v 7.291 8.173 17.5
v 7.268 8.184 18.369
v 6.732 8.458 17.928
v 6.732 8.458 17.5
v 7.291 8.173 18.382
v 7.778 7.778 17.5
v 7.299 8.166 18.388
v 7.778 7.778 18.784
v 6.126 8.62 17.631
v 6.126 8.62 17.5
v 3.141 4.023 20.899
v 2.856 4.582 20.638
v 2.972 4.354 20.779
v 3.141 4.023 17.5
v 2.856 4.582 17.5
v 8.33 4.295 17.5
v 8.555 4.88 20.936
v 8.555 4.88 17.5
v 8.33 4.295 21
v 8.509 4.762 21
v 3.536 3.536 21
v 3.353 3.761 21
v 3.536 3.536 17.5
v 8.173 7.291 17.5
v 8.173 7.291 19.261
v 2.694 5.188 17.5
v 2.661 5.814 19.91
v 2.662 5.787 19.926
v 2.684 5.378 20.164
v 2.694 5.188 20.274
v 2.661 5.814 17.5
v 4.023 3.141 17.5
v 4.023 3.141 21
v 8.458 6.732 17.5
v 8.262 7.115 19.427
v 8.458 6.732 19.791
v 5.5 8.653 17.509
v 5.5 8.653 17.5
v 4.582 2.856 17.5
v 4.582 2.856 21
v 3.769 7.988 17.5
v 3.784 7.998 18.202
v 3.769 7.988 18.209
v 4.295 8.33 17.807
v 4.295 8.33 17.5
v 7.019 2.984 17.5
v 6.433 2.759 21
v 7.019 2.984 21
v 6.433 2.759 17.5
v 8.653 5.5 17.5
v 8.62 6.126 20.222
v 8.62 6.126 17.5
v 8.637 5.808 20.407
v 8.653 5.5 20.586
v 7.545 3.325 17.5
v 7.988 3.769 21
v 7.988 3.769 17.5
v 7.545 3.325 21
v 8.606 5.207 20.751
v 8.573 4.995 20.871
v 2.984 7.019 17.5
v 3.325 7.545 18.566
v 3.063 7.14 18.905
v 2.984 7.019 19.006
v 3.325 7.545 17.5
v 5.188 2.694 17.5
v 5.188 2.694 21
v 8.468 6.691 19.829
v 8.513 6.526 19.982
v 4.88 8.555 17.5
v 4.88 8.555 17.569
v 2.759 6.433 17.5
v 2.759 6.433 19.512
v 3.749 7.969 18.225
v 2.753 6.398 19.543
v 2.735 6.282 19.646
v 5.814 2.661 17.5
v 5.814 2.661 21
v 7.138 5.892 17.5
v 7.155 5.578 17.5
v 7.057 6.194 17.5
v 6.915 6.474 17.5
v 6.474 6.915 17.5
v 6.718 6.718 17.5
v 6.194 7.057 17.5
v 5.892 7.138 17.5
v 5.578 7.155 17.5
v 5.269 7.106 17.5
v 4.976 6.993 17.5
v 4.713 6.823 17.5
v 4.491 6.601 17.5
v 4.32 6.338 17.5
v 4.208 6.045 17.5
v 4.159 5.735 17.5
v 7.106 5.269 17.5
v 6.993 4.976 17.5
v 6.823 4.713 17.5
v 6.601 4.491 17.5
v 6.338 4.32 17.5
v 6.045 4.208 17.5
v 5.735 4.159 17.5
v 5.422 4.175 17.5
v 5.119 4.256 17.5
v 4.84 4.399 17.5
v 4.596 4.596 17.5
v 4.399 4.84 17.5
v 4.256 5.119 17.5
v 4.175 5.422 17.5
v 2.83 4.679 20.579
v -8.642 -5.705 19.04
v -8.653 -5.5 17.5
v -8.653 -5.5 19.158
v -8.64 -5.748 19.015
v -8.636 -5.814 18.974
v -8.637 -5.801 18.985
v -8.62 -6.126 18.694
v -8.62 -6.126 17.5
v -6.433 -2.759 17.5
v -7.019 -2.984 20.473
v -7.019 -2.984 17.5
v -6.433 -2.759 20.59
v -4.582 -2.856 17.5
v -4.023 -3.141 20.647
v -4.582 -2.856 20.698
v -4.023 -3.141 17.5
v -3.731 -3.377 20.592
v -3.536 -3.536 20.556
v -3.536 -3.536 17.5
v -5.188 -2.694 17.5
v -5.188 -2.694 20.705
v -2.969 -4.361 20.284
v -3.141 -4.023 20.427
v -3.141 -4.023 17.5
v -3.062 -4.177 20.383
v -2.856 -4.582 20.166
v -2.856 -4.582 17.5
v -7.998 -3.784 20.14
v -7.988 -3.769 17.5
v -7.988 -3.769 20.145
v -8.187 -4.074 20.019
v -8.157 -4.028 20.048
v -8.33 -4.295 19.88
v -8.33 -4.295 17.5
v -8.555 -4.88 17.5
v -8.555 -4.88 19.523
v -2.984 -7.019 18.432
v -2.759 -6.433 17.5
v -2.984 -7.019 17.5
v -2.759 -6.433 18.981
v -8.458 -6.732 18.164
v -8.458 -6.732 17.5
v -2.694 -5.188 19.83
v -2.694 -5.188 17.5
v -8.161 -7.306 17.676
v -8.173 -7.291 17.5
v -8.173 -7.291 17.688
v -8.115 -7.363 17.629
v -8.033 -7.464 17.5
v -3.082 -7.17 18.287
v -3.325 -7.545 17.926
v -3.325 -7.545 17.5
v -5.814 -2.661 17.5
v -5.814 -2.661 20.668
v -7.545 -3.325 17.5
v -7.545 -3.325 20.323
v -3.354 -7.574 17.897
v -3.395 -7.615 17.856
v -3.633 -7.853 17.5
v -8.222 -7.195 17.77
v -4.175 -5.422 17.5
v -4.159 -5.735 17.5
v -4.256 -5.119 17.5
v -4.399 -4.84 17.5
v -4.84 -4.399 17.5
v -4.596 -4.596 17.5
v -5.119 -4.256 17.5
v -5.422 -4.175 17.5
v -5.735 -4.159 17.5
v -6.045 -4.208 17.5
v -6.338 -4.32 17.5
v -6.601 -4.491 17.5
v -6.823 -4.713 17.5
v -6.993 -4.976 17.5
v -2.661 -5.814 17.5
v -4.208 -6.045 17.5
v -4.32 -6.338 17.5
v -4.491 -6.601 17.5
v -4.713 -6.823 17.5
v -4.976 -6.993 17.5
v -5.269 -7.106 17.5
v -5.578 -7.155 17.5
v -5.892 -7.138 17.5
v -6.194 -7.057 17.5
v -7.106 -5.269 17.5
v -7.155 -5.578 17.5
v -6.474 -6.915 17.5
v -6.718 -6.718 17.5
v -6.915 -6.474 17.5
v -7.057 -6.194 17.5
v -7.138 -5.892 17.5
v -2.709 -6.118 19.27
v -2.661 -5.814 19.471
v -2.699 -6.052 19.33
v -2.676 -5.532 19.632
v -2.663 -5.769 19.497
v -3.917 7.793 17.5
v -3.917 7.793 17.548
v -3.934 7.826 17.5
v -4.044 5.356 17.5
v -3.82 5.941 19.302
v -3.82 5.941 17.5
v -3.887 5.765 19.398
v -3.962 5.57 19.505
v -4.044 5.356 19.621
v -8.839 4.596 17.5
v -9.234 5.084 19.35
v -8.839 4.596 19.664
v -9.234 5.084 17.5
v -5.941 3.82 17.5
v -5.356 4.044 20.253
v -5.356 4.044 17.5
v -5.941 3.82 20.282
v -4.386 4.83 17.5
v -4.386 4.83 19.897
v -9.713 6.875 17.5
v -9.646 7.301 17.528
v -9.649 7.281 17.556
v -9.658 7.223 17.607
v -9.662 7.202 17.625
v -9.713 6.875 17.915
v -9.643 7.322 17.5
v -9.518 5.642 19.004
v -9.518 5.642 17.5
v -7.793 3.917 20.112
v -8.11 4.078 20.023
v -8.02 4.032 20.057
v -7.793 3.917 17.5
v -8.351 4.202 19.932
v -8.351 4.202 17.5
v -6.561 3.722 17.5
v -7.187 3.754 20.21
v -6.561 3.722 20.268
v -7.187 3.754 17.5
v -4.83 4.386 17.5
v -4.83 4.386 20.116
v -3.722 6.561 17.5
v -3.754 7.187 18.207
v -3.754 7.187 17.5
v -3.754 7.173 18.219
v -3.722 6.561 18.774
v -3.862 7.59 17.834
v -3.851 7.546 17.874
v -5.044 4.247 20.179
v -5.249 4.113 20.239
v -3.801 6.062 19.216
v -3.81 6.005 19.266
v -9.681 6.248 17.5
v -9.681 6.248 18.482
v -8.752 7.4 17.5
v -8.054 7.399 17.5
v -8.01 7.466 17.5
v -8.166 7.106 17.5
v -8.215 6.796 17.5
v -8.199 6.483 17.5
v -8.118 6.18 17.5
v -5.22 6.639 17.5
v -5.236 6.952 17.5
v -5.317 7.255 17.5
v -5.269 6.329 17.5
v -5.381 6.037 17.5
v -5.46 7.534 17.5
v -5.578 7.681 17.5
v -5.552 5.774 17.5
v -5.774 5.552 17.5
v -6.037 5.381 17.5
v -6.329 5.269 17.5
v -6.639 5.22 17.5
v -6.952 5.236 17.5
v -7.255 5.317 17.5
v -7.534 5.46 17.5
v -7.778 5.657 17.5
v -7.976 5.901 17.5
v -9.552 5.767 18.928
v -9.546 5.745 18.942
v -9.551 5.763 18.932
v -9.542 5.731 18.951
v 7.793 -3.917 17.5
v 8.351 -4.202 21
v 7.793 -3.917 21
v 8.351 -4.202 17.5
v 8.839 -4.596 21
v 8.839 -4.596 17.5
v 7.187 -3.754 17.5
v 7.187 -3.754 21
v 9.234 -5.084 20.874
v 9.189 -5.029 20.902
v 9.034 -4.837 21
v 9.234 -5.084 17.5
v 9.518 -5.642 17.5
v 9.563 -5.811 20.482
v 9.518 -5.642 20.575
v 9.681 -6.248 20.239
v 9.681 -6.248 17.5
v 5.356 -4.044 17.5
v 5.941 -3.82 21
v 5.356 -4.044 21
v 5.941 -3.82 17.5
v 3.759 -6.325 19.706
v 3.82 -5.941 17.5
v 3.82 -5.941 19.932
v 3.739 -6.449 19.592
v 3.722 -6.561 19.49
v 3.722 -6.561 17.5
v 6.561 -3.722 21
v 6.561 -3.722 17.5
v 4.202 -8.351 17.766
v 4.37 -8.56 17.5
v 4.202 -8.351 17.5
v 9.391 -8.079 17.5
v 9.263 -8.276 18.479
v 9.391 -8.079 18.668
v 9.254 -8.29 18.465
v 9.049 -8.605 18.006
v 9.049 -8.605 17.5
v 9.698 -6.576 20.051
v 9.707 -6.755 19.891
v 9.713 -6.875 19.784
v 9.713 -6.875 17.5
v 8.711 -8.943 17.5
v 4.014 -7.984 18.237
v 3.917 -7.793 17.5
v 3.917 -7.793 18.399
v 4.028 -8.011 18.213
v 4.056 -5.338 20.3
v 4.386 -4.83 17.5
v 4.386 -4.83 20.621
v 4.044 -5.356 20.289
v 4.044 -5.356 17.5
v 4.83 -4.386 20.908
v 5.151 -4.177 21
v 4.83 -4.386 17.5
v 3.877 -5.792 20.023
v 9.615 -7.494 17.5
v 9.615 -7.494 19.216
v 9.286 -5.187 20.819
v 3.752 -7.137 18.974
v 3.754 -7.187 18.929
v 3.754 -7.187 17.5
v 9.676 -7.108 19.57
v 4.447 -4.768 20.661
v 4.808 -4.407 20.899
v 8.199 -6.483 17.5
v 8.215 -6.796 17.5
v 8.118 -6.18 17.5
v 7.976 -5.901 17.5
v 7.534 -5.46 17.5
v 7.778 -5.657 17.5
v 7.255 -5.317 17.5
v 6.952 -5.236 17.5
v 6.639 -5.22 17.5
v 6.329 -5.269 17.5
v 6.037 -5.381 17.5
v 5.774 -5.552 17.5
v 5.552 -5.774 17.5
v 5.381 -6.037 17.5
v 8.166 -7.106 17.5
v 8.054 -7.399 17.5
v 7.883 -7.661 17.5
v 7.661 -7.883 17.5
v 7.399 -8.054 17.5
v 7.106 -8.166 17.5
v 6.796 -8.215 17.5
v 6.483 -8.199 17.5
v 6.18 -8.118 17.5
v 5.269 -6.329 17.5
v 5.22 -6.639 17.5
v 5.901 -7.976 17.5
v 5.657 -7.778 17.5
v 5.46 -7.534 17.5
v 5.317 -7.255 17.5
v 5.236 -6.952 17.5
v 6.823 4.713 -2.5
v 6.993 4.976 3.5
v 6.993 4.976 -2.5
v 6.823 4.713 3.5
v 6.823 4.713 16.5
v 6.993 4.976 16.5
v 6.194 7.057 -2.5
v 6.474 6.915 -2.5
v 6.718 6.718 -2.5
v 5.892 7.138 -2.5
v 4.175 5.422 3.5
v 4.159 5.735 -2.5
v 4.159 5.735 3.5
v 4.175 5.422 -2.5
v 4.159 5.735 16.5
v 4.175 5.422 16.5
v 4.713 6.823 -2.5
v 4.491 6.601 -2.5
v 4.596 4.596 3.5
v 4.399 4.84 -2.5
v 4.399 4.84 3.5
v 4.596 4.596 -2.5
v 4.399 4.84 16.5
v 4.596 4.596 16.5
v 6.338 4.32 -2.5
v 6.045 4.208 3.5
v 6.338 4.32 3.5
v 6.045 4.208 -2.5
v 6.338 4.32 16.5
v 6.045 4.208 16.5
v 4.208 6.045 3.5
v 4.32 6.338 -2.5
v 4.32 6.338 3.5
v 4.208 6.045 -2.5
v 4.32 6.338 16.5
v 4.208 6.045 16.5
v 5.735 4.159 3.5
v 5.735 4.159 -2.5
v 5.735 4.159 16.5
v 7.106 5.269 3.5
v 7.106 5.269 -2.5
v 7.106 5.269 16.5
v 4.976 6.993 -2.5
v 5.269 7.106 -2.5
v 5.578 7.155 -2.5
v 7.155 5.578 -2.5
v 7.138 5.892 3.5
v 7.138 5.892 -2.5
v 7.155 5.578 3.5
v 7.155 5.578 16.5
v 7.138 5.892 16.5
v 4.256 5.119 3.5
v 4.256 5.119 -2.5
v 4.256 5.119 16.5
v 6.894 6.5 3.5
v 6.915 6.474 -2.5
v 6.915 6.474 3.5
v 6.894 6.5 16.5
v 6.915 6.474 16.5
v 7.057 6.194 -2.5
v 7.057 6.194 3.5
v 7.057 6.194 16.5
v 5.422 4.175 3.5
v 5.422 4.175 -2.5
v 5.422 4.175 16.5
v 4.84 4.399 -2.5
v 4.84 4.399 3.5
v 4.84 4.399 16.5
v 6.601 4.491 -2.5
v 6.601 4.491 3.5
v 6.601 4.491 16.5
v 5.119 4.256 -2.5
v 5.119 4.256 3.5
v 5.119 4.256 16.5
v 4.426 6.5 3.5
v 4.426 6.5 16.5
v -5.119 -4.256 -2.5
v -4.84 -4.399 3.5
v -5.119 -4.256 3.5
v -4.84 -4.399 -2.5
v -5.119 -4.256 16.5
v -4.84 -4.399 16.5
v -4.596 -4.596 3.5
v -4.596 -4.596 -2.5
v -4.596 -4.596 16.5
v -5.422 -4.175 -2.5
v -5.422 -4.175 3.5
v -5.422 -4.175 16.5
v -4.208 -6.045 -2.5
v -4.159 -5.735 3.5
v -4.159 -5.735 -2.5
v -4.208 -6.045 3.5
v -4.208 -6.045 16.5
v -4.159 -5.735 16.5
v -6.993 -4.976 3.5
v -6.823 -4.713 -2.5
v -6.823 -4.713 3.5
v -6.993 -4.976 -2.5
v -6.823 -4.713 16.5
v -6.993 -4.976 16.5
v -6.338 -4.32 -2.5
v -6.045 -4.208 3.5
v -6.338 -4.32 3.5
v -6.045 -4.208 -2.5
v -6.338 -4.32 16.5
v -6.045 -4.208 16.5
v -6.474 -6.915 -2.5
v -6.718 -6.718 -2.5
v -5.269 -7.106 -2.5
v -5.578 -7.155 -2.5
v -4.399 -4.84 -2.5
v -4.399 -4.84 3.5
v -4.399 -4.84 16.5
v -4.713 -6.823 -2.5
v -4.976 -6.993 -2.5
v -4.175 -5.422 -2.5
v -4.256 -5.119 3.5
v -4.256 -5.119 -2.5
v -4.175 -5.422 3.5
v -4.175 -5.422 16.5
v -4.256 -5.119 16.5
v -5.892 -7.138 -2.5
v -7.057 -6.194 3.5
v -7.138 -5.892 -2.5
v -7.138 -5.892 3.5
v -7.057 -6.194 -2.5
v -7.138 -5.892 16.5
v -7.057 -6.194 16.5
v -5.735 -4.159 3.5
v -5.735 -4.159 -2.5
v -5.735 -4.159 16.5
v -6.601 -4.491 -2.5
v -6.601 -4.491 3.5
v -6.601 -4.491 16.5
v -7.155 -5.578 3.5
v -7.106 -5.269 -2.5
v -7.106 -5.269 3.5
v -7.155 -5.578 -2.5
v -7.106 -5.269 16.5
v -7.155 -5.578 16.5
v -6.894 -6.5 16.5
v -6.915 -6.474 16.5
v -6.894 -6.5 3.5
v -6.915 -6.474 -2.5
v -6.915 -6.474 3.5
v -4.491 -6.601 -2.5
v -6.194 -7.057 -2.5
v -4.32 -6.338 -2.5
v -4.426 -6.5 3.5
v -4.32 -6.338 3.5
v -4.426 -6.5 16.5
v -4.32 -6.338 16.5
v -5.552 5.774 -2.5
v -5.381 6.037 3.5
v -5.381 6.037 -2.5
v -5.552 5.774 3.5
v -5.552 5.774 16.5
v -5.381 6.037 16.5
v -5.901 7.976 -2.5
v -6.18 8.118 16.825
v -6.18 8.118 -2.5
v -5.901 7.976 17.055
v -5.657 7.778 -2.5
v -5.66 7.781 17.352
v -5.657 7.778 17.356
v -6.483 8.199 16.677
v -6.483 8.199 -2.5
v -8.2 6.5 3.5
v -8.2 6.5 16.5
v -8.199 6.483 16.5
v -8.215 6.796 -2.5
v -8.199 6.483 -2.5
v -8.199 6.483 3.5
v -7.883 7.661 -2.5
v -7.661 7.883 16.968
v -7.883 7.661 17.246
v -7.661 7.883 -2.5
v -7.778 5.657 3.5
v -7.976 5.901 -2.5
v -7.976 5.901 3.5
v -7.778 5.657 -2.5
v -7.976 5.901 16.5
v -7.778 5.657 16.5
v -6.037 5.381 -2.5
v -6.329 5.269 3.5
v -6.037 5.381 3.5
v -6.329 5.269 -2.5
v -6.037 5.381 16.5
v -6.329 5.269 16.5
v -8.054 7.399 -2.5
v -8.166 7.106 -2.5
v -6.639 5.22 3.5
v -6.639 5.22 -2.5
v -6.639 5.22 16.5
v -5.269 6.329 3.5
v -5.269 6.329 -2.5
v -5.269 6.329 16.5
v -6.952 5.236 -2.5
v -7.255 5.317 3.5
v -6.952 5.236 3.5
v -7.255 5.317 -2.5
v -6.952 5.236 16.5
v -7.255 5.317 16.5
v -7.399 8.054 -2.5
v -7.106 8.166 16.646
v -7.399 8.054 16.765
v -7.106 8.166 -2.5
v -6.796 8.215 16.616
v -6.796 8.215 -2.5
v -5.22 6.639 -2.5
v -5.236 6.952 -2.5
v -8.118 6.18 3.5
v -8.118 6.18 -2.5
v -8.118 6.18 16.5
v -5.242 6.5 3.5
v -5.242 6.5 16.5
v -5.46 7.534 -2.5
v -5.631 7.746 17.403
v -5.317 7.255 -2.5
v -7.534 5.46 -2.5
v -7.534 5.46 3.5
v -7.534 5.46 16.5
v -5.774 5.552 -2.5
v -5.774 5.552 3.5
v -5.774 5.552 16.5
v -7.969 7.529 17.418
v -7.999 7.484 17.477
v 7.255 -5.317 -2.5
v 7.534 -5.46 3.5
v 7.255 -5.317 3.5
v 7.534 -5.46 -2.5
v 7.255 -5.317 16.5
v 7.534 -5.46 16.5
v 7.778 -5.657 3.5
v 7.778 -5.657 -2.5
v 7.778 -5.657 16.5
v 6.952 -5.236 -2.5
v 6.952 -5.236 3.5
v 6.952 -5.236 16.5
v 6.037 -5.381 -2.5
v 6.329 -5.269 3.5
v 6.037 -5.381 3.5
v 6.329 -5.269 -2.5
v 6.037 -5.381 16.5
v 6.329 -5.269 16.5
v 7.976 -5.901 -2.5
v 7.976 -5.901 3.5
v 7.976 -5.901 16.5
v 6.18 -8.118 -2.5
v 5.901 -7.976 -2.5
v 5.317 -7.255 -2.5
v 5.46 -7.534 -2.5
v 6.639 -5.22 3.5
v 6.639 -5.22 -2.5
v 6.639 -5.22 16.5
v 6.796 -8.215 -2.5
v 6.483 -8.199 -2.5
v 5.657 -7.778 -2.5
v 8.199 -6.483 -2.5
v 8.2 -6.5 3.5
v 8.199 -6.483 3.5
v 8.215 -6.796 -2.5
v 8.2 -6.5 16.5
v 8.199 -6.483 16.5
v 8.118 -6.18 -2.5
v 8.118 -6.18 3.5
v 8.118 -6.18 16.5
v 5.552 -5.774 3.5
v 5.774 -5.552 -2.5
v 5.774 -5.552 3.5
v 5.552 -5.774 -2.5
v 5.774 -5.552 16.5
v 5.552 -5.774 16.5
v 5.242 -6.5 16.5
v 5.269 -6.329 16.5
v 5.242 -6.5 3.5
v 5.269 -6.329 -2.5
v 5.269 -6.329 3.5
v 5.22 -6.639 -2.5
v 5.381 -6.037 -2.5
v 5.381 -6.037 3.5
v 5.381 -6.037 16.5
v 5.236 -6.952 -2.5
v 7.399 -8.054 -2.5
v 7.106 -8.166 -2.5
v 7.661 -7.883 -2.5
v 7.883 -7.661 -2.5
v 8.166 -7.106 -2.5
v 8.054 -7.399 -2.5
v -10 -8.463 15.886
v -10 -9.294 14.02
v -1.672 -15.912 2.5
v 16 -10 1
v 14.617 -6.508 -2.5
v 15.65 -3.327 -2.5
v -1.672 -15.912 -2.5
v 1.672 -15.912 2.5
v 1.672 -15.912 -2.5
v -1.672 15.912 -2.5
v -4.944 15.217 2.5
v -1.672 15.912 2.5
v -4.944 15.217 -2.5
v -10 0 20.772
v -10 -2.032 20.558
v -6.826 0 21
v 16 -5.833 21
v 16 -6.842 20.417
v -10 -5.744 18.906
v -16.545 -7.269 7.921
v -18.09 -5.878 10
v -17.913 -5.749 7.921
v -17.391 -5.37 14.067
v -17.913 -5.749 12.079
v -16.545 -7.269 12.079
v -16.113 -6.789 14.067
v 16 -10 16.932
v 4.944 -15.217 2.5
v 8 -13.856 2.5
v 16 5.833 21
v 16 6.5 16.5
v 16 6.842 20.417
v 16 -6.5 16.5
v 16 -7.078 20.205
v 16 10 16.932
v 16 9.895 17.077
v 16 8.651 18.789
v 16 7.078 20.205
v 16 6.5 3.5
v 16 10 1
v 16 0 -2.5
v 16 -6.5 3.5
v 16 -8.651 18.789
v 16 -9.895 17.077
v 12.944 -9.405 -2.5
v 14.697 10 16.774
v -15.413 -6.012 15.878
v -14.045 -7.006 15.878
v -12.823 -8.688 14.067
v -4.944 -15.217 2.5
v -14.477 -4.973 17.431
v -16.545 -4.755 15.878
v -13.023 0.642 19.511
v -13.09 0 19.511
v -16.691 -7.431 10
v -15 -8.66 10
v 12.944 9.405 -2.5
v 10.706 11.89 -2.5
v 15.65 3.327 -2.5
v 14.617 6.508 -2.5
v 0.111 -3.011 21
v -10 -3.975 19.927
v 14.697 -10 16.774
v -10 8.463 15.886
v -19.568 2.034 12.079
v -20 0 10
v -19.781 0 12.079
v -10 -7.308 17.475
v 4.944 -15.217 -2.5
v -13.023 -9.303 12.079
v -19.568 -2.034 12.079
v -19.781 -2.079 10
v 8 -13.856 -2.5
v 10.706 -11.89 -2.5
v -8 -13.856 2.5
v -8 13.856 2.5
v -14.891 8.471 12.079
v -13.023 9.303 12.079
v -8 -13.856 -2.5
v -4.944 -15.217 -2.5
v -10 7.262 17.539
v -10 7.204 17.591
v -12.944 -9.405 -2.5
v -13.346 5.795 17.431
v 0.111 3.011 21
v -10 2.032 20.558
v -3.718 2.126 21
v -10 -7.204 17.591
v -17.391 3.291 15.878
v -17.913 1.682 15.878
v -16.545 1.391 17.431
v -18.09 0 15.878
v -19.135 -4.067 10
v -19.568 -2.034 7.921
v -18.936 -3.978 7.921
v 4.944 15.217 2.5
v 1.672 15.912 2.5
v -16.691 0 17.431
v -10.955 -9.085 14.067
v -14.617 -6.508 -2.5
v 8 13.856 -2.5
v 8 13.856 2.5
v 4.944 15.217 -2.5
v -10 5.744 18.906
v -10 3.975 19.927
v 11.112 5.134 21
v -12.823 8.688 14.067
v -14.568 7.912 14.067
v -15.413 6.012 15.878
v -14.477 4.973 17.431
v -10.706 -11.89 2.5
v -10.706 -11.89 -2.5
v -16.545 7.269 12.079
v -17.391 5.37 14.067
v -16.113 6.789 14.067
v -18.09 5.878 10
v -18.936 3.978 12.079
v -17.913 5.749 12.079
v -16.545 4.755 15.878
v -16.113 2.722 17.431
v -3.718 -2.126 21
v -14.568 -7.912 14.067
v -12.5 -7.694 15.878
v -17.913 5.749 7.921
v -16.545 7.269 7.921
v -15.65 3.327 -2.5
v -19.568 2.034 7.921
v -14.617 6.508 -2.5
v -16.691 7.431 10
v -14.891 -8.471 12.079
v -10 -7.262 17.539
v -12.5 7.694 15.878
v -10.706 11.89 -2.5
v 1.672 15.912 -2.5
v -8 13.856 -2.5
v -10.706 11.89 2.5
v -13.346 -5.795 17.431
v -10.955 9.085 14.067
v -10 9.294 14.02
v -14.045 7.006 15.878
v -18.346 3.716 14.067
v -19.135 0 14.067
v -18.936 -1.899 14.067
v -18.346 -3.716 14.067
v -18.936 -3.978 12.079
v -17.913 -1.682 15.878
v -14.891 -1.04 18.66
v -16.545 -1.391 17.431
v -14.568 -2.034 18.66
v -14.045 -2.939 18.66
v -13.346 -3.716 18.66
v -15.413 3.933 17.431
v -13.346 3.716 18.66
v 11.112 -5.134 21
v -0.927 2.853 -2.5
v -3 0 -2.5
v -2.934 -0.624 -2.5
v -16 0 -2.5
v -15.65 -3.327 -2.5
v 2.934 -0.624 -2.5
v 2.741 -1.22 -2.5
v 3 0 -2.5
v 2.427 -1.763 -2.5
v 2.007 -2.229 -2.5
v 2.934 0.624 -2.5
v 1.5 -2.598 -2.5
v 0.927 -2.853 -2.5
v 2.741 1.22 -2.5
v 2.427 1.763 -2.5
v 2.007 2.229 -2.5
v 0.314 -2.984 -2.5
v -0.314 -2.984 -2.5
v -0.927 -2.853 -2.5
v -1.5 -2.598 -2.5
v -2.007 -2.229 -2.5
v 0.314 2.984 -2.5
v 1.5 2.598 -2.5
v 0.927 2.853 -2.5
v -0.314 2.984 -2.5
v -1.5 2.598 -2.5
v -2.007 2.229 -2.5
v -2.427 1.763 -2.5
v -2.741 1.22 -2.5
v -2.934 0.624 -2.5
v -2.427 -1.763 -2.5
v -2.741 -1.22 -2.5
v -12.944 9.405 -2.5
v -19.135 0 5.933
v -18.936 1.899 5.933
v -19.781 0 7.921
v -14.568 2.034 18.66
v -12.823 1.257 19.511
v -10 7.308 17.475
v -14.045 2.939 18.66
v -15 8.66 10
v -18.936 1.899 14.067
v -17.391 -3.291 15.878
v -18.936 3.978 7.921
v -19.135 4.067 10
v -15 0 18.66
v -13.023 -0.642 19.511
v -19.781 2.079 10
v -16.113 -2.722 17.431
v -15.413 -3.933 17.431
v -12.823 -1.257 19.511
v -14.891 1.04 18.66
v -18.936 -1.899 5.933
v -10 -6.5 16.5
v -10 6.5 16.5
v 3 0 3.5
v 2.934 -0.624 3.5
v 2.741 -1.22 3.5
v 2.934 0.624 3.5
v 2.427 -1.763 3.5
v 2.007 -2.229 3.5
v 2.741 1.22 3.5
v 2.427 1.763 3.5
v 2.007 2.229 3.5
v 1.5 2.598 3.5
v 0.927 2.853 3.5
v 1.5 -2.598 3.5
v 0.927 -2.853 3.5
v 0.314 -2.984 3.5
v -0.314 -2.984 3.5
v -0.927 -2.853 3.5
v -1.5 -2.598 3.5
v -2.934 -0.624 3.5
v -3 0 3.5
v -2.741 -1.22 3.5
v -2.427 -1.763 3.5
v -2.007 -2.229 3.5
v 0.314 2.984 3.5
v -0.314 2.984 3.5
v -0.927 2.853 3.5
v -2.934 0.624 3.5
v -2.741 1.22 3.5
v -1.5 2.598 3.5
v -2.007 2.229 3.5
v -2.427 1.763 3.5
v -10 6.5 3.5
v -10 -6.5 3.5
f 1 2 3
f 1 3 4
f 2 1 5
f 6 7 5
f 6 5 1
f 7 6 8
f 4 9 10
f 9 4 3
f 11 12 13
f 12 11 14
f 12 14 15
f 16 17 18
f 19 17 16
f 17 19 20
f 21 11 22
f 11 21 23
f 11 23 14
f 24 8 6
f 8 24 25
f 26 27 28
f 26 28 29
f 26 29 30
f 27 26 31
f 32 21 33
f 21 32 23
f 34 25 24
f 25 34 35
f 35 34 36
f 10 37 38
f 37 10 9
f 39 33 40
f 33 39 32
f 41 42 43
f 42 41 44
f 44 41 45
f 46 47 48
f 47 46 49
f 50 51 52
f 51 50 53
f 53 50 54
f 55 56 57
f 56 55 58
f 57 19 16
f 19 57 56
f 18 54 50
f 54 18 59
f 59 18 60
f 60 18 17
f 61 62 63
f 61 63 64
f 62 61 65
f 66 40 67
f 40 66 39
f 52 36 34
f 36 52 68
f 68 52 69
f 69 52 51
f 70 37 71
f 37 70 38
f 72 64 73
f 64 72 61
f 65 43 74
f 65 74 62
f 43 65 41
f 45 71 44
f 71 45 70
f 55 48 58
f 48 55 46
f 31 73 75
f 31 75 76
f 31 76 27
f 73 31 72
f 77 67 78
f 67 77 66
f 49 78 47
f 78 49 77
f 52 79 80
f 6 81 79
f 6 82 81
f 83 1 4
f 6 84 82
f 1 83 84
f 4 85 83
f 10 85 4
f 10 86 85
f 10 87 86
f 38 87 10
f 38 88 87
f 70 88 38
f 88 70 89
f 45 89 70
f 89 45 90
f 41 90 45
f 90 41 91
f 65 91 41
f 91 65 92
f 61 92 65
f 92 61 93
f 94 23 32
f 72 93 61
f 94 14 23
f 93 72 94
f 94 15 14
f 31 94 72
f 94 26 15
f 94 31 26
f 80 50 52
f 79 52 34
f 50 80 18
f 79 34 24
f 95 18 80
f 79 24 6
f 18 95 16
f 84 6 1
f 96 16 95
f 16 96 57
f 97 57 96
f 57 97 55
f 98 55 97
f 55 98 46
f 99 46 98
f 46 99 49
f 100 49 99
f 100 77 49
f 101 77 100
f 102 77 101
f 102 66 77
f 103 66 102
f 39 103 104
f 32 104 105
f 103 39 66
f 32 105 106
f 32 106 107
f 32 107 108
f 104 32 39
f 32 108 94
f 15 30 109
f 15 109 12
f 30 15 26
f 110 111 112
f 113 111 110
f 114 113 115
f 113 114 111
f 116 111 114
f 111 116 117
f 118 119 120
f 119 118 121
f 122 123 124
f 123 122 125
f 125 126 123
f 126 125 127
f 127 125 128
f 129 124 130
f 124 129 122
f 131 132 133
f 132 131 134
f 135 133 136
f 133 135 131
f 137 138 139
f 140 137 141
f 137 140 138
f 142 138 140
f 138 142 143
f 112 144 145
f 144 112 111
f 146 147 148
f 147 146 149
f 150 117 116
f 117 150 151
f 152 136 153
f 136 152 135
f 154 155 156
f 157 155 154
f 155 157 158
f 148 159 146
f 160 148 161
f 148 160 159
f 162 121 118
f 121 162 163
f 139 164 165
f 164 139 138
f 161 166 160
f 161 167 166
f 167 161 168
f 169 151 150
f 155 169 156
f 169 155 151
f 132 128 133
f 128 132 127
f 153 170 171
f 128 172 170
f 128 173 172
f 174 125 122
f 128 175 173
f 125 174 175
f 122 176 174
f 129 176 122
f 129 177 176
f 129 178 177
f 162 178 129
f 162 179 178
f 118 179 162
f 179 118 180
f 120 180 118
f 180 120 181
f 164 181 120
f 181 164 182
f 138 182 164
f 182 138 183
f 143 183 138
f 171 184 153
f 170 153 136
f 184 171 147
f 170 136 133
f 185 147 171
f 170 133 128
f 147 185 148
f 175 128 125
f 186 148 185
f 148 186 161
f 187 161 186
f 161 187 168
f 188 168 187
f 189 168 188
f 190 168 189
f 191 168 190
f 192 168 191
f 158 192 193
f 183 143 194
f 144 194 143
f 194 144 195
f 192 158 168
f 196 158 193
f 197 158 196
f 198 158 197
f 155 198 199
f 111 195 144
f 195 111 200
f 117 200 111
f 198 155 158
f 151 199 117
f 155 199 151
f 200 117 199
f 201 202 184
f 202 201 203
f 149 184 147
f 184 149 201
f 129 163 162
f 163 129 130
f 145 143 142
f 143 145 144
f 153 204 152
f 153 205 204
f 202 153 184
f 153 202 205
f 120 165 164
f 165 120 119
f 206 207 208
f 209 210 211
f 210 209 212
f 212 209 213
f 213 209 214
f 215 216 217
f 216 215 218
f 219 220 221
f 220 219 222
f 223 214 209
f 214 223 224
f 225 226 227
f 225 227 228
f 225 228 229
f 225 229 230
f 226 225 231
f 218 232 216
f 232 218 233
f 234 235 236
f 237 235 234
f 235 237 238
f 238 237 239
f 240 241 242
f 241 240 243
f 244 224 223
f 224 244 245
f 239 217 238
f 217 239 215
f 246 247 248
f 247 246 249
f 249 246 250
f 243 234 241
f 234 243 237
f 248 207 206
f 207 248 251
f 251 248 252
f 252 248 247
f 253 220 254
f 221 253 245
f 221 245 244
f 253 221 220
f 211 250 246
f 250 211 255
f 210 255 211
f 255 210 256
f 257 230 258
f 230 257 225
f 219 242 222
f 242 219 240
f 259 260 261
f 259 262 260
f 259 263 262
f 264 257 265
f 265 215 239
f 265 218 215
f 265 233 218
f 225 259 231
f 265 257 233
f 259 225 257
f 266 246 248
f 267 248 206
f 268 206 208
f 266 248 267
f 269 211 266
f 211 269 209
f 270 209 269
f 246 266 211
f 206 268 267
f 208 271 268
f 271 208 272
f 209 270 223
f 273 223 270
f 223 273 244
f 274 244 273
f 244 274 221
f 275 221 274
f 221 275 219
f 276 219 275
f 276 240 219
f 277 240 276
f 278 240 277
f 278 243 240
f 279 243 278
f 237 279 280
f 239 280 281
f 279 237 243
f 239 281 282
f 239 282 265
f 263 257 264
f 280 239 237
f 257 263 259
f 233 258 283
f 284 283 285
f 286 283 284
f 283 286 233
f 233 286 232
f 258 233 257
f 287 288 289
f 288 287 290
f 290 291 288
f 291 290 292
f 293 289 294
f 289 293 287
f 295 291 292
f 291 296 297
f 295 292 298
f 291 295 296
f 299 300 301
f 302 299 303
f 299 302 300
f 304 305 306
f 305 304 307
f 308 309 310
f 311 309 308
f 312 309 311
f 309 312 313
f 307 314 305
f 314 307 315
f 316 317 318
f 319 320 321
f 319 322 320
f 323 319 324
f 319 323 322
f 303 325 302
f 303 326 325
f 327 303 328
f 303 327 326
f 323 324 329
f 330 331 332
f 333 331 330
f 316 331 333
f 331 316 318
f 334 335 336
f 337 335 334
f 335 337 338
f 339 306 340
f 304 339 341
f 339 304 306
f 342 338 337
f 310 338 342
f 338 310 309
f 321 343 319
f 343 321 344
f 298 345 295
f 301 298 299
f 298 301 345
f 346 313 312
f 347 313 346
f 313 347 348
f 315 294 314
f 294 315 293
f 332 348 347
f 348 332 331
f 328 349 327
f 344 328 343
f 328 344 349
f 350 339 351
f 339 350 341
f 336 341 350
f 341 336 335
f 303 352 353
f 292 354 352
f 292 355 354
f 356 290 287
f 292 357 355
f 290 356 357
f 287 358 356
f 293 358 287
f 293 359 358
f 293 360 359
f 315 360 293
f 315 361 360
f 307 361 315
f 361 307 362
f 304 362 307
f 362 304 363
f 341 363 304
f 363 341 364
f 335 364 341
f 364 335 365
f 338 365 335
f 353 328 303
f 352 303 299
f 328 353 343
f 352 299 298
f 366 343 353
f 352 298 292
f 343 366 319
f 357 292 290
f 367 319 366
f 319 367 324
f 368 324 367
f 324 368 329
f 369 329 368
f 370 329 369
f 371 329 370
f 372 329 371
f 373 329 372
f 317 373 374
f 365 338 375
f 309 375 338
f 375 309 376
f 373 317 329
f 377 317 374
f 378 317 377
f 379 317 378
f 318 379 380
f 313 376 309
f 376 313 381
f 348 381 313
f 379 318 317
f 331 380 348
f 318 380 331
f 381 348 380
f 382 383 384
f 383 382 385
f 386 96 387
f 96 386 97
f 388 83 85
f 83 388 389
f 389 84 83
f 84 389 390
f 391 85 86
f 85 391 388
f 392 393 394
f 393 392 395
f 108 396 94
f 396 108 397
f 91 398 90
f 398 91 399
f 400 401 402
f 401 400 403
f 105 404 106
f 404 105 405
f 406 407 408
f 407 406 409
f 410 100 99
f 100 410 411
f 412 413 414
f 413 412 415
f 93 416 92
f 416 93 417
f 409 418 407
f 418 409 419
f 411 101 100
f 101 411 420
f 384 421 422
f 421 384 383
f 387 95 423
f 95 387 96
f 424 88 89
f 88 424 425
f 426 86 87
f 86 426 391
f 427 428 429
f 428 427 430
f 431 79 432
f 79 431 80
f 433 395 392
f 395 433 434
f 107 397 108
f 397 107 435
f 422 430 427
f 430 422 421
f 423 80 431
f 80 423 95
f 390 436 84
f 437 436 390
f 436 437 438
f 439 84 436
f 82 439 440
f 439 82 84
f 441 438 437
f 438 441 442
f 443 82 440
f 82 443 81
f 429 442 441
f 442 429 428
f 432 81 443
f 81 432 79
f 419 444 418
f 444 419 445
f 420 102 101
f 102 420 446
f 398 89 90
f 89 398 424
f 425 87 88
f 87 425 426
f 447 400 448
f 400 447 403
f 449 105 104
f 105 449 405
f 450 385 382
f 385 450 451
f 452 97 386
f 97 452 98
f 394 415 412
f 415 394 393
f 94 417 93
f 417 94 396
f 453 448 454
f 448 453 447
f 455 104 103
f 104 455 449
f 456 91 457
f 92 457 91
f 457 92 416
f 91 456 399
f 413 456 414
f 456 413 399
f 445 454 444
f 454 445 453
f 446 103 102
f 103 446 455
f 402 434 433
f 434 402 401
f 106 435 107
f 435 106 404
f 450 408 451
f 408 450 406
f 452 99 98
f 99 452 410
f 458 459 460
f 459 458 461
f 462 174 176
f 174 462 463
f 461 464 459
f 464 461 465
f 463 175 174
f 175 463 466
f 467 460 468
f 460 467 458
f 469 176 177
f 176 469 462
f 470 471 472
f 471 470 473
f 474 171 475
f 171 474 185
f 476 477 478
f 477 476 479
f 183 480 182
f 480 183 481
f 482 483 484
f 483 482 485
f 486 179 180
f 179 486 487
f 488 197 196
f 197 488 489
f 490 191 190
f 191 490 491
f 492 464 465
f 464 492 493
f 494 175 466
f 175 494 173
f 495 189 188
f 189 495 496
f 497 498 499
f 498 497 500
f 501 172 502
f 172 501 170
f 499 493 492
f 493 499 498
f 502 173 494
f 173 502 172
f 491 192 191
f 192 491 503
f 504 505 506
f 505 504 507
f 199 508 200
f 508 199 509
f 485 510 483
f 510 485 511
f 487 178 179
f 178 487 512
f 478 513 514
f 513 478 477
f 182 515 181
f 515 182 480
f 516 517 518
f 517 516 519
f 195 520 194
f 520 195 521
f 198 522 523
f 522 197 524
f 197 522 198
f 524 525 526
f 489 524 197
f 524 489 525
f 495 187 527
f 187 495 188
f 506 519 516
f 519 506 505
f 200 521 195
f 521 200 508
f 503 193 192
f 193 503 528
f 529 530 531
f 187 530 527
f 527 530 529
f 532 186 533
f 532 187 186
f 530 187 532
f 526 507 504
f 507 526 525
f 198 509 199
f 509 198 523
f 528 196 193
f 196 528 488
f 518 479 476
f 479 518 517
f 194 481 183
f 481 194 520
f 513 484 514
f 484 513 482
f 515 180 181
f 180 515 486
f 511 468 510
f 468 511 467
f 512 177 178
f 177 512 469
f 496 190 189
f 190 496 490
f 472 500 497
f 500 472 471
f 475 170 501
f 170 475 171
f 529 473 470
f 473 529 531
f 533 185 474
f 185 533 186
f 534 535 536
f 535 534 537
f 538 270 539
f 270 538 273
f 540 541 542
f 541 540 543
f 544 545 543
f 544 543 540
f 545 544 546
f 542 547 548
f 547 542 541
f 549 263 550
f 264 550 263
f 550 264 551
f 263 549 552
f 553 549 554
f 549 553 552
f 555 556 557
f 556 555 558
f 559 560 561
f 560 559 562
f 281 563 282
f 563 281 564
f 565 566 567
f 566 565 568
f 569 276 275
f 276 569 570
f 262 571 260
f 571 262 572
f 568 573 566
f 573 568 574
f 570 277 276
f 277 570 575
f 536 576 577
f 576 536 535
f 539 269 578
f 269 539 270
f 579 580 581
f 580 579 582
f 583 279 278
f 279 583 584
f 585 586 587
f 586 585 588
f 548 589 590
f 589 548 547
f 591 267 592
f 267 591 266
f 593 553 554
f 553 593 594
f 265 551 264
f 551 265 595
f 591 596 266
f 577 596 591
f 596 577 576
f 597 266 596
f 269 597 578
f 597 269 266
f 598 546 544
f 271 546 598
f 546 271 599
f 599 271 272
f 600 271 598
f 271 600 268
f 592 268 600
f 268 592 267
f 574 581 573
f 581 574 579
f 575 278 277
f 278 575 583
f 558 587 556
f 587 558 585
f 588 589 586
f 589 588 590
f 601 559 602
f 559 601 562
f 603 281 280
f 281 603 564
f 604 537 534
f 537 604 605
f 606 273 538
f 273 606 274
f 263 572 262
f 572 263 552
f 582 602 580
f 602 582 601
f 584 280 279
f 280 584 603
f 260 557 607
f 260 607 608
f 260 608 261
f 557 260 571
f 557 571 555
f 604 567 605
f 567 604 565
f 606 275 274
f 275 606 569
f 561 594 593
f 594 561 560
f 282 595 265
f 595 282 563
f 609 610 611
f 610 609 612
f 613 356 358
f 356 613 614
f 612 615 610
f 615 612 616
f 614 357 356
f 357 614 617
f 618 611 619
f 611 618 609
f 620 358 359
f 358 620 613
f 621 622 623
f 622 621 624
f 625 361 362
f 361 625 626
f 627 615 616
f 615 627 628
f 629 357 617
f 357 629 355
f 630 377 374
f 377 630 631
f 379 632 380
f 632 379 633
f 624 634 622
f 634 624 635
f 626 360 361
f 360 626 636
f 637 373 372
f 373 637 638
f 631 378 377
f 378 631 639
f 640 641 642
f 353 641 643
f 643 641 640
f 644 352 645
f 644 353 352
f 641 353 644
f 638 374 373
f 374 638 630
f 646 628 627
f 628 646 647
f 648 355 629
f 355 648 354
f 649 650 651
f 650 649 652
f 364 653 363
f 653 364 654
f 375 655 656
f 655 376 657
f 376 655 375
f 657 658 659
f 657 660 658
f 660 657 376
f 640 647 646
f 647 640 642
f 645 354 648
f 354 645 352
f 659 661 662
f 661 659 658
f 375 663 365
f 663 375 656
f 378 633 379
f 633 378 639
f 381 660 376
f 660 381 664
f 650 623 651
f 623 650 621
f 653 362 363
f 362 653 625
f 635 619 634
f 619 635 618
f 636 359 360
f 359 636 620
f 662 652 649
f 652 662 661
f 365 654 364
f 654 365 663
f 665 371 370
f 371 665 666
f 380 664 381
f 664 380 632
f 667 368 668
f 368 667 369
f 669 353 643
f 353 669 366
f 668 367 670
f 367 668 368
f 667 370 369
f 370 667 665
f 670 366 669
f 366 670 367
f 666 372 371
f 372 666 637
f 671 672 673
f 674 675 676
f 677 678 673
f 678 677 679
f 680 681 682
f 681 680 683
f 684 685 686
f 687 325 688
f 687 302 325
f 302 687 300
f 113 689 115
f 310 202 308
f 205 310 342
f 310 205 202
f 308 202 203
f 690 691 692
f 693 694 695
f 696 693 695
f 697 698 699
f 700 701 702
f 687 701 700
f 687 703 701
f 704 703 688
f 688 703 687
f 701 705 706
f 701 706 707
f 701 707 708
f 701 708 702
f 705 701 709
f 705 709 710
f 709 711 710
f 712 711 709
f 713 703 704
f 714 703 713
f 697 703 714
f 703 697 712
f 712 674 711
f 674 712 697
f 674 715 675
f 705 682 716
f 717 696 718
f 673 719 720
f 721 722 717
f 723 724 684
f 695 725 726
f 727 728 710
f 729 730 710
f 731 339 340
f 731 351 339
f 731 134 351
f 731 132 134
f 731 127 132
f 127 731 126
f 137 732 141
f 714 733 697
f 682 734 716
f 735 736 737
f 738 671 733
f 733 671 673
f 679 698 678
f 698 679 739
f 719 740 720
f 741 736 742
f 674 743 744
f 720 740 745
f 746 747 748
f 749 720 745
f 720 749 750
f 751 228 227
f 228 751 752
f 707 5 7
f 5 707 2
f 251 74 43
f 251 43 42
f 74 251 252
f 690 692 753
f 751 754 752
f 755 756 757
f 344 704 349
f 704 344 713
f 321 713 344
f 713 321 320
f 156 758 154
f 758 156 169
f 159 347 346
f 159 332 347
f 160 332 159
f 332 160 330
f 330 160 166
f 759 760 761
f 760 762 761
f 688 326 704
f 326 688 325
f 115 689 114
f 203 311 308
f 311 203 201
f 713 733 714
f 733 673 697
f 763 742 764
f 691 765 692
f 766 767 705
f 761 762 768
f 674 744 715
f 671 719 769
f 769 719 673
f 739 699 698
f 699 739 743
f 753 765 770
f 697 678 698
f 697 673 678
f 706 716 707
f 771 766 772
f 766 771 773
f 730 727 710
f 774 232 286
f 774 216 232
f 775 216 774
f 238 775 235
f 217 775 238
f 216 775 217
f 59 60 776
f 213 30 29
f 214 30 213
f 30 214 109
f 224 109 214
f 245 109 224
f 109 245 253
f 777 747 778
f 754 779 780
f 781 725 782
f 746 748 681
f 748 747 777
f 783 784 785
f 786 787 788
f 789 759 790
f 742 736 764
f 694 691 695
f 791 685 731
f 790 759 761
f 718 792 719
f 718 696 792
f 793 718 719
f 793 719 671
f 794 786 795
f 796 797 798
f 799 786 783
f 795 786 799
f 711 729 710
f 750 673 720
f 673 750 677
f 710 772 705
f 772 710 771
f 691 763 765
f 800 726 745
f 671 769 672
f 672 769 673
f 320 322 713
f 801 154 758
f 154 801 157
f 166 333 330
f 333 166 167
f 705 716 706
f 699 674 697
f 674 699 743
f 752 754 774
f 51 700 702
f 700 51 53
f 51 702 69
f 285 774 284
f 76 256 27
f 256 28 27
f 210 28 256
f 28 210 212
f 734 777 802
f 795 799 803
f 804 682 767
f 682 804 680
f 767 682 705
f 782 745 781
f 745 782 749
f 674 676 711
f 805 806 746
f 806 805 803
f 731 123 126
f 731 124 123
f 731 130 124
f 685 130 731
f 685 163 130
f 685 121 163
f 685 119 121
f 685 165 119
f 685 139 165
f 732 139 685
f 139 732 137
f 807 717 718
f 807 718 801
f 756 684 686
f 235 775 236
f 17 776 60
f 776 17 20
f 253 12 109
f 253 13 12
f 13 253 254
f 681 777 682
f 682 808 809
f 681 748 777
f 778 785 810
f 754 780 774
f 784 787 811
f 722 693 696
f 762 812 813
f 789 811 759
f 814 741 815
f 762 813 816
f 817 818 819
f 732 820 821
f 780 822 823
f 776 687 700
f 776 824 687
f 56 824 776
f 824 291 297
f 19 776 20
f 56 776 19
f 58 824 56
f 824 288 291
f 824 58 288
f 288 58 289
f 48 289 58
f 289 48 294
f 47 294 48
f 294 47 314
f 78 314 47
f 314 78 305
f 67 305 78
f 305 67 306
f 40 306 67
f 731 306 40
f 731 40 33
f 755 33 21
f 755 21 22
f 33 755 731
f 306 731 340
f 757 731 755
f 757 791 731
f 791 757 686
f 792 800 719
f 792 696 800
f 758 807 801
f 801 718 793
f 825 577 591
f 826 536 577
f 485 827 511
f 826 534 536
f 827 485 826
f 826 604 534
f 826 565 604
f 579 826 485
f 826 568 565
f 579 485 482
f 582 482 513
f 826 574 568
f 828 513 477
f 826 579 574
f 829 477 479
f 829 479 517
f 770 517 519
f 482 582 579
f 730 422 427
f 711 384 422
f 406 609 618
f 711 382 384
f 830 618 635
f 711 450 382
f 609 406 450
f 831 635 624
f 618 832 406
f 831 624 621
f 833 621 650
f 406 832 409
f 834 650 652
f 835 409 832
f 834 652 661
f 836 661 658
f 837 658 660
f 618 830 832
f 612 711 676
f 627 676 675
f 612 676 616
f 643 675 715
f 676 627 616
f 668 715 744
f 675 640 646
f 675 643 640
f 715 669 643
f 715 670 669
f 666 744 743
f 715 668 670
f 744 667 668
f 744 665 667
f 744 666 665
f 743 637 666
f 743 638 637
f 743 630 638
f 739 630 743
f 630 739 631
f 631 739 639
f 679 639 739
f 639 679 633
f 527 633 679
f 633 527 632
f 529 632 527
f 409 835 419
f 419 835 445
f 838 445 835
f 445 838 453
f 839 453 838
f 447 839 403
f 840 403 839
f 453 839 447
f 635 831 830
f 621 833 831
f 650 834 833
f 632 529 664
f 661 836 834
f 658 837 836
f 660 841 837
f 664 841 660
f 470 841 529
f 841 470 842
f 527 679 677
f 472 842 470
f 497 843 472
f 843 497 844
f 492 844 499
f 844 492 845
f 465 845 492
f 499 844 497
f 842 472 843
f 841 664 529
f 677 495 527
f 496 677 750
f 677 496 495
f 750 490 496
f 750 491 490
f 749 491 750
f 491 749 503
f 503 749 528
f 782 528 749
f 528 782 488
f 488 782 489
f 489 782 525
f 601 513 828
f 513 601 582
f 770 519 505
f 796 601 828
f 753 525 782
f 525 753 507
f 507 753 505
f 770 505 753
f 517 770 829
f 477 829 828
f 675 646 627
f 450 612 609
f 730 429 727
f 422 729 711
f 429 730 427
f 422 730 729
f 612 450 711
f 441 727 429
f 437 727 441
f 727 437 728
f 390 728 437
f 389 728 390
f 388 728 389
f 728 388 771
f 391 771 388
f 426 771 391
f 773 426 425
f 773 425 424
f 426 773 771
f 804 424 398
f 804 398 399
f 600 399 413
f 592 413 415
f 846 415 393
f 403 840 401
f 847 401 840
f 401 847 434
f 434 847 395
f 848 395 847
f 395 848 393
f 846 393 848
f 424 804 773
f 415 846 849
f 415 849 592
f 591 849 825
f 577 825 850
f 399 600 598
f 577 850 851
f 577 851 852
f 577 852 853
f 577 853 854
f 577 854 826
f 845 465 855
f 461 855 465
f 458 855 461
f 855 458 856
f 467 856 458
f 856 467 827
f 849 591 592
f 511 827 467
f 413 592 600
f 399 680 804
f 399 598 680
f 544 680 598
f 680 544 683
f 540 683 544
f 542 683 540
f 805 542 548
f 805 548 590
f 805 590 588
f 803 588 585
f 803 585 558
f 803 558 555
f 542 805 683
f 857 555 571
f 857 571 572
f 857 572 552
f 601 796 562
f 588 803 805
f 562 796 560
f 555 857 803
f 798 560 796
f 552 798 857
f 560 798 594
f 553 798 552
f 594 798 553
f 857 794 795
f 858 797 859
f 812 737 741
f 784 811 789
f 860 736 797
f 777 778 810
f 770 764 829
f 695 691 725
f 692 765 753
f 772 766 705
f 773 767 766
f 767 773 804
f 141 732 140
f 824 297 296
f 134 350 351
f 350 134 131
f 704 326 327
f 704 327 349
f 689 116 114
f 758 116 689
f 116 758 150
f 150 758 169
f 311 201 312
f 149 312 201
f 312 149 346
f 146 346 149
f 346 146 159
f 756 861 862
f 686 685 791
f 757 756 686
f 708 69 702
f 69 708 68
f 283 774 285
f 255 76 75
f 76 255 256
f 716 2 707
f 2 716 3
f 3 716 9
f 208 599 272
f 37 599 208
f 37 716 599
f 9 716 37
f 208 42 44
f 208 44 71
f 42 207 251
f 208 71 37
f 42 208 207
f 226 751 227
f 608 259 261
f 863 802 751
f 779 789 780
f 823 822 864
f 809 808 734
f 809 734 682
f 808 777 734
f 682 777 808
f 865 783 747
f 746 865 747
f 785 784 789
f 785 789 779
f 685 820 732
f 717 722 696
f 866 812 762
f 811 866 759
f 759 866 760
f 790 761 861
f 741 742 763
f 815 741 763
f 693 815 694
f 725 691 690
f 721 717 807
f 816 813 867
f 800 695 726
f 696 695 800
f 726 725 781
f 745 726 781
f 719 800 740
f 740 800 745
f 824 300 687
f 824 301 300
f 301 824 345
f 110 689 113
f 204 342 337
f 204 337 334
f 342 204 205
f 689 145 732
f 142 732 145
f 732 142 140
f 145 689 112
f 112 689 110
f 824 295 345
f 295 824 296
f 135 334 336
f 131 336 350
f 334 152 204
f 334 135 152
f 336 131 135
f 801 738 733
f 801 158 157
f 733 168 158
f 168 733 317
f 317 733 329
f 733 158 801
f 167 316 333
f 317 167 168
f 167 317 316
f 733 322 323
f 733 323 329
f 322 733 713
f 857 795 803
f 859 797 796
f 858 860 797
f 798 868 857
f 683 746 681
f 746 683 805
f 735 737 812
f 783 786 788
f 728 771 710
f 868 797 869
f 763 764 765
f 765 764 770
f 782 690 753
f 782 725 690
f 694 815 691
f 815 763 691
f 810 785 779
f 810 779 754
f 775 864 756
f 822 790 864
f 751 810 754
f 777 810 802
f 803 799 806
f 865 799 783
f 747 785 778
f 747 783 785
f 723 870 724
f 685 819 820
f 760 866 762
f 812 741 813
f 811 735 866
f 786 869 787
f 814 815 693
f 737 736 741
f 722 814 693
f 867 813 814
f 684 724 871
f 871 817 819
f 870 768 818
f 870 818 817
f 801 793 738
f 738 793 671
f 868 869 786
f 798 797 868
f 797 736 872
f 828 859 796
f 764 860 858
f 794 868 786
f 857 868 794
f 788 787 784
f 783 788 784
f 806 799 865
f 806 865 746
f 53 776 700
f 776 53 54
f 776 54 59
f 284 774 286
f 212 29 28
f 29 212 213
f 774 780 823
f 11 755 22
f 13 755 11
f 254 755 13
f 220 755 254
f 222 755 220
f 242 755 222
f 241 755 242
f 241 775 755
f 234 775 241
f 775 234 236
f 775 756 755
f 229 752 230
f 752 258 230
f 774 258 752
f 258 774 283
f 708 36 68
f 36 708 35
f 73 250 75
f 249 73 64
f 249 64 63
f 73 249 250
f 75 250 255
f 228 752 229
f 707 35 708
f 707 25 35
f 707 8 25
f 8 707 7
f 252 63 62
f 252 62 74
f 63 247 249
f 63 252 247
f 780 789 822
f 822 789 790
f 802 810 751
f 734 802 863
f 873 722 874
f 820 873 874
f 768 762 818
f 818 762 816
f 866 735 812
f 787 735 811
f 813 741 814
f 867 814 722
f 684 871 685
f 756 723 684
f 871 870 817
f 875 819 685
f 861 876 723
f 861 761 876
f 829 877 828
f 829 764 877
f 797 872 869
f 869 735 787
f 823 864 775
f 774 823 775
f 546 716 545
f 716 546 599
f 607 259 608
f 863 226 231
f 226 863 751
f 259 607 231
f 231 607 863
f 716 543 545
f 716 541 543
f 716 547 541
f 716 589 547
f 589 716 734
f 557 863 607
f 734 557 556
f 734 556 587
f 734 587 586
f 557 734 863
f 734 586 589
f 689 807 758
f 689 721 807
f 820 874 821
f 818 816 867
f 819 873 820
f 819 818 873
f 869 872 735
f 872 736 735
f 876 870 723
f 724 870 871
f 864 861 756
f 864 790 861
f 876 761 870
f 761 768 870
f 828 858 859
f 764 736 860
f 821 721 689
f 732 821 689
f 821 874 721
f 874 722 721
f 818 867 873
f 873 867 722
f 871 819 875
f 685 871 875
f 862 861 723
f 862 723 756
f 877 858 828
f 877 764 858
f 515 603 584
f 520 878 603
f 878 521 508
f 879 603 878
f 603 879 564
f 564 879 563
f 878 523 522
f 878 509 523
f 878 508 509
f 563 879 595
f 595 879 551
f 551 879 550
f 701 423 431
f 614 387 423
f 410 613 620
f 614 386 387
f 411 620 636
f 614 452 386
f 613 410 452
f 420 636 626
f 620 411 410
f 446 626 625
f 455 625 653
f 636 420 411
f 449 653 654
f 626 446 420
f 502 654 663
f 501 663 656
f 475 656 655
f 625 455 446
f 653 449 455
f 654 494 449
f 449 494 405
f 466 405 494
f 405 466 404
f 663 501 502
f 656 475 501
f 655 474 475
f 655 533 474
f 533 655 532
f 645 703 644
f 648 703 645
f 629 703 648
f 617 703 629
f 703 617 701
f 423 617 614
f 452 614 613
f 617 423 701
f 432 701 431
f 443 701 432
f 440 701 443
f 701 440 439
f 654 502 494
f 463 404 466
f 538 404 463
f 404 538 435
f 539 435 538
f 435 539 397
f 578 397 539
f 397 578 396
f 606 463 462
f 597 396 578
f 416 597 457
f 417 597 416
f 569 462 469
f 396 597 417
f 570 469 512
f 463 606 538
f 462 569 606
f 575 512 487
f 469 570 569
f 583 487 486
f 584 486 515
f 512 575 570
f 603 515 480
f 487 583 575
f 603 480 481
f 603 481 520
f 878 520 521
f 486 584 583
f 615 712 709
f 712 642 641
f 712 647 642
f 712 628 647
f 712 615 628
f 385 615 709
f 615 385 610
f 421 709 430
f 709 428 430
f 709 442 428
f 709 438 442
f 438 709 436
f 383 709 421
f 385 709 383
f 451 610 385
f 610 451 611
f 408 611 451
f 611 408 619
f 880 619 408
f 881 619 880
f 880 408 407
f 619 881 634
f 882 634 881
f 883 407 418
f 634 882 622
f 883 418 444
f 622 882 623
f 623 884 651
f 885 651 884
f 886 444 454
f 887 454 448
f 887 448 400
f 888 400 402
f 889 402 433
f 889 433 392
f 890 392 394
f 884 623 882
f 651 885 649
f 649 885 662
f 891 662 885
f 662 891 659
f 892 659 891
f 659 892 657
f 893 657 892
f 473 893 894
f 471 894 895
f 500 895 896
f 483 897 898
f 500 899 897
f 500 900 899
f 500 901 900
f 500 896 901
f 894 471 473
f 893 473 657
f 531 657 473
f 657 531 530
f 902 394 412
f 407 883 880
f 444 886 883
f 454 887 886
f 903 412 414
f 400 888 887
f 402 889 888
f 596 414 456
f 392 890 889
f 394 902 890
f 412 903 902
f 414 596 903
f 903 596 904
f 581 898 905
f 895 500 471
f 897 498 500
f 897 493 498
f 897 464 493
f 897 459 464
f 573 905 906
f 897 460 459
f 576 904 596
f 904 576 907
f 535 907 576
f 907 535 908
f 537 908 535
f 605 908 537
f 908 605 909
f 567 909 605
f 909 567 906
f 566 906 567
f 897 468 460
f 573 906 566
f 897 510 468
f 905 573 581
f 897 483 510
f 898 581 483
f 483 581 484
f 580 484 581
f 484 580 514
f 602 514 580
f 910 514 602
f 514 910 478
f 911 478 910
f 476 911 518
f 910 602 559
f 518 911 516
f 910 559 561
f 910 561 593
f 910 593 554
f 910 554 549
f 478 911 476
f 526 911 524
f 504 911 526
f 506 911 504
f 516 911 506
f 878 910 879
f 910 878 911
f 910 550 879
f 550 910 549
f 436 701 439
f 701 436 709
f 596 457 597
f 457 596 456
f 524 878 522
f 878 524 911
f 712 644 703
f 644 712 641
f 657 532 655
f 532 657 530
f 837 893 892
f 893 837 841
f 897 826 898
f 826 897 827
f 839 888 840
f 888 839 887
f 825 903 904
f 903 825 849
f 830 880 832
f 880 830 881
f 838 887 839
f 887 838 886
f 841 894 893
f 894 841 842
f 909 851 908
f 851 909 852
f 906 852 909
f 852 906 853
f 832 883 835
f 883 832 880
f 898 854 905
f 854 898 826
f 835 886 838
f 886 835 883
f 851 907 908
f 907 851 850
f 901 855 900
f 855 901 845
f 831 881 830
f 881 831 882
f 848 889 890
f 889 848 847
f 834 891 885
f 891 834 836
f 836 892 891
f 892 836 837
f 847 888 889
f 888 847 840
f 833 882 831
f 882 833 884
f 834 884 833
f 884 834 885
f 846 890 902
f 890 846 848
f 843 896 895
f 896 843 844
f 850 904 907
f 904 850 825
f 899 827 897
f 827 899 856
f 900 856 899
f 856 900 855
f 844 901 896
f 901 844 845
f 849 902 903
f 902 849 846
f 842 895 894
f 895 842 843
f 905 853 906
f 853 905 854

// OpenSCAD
/* [Motor Bolts] */
Motor_Bolt_X_spacing = 16; // Motor Bolts X distance
Motor_Bolt_Y_spacing = 19; // Motor Bolts Y distance
Screw_Size = 3; // Screw Size

/* [Motor Plate] */
Plate_Thickness = 5;
Plate_Diameter = 32;

/* [Arm Size] */
arm_outside_diameter = 13;

/* [Shell Size] */
Shell_OD = 20;

/* [Hidden] */
$fs = 0.2;
Plate_Radius = Plate_Diameter/2;


difference() {
    hull() {
        difference() {
            // Shell
            translate([3,0,11]) cube([26,Shell_OD,Shell_OD],true);
            // Shell clipping shape
            difference() {
                translate([5,0,11]) cube([32,Shell_OD+1,Shell_OD+1],true);      
                translate([5,0,11]) rotate([0,90,0]) cylinder(32,9.7,12,true);
                translate([5,0,0]) cube([40,Shell_OD+1,Shell_OD+1],true);
            }
        }
        // Motor Plate
        cylinder(Plate_Thickness,Plate_Radius,Plate_Radius,true);
        // End Ball
        translate([-Shell_OD/2,0,Shell_OD/2]) sphere(Shell_OD/2);
    }
    // Remove arm material
    translate ([20,0,10]) cube([60,arm_outside_diameter,arm_outside_diameter],true);
    // Remove motor post material
    translate([0,0,30]) motor_posts(25);
    // Remove motor screw material
    motor_screws(50);
    // Remove motor shaft clerance
    translate([0,0,0]) cylinder(8,3,3,true);
}

module motor_posts(sl=10) {
    rotate([0,0,45]) {
    translate([Motor_Bolt_X_spacing/2,0,0]) cylinder(sl,Screw_Size,Screw_Size,true);
    translate([-Motor_Bolt_X_spacing/2,0,0]) cylinder(sl,Screw_Size,Screw_Size,true);
    translate([0,Motor_Bolt_Y_spacing/2,0]) cylinder(sl,Screw_Size,Screw_Size,true);
    translate([0,-Motor_Bolt_Y_spacing/2,0]) cylinder(sl,Screw_Size,Screw_Size,true);
    }
}

module motor_screws(sl=10) {
    rotate([0,0,45]) {
    translate([Motor_Bolt_X_spacing/2,0,0]) cylinder(sl,Screw_Size/2,Screw_Size/2,true);
    translate([-Motor_Bolt_X_spacing/2,0,0]) cylinder(sl,Screw_Size/2,Screw_Size/2,true);
    translate([0,Motor_Bolt_Y_spacing/2,0]) cylinder(sl,Screw_Size/2,Screw_Size/2,true);
    translate([0/2,-Motor_Bolt_Y_spacing/2,0]) cylinder(sl,Screw_Size/2,Screw_Size/2,true);
    }
}
